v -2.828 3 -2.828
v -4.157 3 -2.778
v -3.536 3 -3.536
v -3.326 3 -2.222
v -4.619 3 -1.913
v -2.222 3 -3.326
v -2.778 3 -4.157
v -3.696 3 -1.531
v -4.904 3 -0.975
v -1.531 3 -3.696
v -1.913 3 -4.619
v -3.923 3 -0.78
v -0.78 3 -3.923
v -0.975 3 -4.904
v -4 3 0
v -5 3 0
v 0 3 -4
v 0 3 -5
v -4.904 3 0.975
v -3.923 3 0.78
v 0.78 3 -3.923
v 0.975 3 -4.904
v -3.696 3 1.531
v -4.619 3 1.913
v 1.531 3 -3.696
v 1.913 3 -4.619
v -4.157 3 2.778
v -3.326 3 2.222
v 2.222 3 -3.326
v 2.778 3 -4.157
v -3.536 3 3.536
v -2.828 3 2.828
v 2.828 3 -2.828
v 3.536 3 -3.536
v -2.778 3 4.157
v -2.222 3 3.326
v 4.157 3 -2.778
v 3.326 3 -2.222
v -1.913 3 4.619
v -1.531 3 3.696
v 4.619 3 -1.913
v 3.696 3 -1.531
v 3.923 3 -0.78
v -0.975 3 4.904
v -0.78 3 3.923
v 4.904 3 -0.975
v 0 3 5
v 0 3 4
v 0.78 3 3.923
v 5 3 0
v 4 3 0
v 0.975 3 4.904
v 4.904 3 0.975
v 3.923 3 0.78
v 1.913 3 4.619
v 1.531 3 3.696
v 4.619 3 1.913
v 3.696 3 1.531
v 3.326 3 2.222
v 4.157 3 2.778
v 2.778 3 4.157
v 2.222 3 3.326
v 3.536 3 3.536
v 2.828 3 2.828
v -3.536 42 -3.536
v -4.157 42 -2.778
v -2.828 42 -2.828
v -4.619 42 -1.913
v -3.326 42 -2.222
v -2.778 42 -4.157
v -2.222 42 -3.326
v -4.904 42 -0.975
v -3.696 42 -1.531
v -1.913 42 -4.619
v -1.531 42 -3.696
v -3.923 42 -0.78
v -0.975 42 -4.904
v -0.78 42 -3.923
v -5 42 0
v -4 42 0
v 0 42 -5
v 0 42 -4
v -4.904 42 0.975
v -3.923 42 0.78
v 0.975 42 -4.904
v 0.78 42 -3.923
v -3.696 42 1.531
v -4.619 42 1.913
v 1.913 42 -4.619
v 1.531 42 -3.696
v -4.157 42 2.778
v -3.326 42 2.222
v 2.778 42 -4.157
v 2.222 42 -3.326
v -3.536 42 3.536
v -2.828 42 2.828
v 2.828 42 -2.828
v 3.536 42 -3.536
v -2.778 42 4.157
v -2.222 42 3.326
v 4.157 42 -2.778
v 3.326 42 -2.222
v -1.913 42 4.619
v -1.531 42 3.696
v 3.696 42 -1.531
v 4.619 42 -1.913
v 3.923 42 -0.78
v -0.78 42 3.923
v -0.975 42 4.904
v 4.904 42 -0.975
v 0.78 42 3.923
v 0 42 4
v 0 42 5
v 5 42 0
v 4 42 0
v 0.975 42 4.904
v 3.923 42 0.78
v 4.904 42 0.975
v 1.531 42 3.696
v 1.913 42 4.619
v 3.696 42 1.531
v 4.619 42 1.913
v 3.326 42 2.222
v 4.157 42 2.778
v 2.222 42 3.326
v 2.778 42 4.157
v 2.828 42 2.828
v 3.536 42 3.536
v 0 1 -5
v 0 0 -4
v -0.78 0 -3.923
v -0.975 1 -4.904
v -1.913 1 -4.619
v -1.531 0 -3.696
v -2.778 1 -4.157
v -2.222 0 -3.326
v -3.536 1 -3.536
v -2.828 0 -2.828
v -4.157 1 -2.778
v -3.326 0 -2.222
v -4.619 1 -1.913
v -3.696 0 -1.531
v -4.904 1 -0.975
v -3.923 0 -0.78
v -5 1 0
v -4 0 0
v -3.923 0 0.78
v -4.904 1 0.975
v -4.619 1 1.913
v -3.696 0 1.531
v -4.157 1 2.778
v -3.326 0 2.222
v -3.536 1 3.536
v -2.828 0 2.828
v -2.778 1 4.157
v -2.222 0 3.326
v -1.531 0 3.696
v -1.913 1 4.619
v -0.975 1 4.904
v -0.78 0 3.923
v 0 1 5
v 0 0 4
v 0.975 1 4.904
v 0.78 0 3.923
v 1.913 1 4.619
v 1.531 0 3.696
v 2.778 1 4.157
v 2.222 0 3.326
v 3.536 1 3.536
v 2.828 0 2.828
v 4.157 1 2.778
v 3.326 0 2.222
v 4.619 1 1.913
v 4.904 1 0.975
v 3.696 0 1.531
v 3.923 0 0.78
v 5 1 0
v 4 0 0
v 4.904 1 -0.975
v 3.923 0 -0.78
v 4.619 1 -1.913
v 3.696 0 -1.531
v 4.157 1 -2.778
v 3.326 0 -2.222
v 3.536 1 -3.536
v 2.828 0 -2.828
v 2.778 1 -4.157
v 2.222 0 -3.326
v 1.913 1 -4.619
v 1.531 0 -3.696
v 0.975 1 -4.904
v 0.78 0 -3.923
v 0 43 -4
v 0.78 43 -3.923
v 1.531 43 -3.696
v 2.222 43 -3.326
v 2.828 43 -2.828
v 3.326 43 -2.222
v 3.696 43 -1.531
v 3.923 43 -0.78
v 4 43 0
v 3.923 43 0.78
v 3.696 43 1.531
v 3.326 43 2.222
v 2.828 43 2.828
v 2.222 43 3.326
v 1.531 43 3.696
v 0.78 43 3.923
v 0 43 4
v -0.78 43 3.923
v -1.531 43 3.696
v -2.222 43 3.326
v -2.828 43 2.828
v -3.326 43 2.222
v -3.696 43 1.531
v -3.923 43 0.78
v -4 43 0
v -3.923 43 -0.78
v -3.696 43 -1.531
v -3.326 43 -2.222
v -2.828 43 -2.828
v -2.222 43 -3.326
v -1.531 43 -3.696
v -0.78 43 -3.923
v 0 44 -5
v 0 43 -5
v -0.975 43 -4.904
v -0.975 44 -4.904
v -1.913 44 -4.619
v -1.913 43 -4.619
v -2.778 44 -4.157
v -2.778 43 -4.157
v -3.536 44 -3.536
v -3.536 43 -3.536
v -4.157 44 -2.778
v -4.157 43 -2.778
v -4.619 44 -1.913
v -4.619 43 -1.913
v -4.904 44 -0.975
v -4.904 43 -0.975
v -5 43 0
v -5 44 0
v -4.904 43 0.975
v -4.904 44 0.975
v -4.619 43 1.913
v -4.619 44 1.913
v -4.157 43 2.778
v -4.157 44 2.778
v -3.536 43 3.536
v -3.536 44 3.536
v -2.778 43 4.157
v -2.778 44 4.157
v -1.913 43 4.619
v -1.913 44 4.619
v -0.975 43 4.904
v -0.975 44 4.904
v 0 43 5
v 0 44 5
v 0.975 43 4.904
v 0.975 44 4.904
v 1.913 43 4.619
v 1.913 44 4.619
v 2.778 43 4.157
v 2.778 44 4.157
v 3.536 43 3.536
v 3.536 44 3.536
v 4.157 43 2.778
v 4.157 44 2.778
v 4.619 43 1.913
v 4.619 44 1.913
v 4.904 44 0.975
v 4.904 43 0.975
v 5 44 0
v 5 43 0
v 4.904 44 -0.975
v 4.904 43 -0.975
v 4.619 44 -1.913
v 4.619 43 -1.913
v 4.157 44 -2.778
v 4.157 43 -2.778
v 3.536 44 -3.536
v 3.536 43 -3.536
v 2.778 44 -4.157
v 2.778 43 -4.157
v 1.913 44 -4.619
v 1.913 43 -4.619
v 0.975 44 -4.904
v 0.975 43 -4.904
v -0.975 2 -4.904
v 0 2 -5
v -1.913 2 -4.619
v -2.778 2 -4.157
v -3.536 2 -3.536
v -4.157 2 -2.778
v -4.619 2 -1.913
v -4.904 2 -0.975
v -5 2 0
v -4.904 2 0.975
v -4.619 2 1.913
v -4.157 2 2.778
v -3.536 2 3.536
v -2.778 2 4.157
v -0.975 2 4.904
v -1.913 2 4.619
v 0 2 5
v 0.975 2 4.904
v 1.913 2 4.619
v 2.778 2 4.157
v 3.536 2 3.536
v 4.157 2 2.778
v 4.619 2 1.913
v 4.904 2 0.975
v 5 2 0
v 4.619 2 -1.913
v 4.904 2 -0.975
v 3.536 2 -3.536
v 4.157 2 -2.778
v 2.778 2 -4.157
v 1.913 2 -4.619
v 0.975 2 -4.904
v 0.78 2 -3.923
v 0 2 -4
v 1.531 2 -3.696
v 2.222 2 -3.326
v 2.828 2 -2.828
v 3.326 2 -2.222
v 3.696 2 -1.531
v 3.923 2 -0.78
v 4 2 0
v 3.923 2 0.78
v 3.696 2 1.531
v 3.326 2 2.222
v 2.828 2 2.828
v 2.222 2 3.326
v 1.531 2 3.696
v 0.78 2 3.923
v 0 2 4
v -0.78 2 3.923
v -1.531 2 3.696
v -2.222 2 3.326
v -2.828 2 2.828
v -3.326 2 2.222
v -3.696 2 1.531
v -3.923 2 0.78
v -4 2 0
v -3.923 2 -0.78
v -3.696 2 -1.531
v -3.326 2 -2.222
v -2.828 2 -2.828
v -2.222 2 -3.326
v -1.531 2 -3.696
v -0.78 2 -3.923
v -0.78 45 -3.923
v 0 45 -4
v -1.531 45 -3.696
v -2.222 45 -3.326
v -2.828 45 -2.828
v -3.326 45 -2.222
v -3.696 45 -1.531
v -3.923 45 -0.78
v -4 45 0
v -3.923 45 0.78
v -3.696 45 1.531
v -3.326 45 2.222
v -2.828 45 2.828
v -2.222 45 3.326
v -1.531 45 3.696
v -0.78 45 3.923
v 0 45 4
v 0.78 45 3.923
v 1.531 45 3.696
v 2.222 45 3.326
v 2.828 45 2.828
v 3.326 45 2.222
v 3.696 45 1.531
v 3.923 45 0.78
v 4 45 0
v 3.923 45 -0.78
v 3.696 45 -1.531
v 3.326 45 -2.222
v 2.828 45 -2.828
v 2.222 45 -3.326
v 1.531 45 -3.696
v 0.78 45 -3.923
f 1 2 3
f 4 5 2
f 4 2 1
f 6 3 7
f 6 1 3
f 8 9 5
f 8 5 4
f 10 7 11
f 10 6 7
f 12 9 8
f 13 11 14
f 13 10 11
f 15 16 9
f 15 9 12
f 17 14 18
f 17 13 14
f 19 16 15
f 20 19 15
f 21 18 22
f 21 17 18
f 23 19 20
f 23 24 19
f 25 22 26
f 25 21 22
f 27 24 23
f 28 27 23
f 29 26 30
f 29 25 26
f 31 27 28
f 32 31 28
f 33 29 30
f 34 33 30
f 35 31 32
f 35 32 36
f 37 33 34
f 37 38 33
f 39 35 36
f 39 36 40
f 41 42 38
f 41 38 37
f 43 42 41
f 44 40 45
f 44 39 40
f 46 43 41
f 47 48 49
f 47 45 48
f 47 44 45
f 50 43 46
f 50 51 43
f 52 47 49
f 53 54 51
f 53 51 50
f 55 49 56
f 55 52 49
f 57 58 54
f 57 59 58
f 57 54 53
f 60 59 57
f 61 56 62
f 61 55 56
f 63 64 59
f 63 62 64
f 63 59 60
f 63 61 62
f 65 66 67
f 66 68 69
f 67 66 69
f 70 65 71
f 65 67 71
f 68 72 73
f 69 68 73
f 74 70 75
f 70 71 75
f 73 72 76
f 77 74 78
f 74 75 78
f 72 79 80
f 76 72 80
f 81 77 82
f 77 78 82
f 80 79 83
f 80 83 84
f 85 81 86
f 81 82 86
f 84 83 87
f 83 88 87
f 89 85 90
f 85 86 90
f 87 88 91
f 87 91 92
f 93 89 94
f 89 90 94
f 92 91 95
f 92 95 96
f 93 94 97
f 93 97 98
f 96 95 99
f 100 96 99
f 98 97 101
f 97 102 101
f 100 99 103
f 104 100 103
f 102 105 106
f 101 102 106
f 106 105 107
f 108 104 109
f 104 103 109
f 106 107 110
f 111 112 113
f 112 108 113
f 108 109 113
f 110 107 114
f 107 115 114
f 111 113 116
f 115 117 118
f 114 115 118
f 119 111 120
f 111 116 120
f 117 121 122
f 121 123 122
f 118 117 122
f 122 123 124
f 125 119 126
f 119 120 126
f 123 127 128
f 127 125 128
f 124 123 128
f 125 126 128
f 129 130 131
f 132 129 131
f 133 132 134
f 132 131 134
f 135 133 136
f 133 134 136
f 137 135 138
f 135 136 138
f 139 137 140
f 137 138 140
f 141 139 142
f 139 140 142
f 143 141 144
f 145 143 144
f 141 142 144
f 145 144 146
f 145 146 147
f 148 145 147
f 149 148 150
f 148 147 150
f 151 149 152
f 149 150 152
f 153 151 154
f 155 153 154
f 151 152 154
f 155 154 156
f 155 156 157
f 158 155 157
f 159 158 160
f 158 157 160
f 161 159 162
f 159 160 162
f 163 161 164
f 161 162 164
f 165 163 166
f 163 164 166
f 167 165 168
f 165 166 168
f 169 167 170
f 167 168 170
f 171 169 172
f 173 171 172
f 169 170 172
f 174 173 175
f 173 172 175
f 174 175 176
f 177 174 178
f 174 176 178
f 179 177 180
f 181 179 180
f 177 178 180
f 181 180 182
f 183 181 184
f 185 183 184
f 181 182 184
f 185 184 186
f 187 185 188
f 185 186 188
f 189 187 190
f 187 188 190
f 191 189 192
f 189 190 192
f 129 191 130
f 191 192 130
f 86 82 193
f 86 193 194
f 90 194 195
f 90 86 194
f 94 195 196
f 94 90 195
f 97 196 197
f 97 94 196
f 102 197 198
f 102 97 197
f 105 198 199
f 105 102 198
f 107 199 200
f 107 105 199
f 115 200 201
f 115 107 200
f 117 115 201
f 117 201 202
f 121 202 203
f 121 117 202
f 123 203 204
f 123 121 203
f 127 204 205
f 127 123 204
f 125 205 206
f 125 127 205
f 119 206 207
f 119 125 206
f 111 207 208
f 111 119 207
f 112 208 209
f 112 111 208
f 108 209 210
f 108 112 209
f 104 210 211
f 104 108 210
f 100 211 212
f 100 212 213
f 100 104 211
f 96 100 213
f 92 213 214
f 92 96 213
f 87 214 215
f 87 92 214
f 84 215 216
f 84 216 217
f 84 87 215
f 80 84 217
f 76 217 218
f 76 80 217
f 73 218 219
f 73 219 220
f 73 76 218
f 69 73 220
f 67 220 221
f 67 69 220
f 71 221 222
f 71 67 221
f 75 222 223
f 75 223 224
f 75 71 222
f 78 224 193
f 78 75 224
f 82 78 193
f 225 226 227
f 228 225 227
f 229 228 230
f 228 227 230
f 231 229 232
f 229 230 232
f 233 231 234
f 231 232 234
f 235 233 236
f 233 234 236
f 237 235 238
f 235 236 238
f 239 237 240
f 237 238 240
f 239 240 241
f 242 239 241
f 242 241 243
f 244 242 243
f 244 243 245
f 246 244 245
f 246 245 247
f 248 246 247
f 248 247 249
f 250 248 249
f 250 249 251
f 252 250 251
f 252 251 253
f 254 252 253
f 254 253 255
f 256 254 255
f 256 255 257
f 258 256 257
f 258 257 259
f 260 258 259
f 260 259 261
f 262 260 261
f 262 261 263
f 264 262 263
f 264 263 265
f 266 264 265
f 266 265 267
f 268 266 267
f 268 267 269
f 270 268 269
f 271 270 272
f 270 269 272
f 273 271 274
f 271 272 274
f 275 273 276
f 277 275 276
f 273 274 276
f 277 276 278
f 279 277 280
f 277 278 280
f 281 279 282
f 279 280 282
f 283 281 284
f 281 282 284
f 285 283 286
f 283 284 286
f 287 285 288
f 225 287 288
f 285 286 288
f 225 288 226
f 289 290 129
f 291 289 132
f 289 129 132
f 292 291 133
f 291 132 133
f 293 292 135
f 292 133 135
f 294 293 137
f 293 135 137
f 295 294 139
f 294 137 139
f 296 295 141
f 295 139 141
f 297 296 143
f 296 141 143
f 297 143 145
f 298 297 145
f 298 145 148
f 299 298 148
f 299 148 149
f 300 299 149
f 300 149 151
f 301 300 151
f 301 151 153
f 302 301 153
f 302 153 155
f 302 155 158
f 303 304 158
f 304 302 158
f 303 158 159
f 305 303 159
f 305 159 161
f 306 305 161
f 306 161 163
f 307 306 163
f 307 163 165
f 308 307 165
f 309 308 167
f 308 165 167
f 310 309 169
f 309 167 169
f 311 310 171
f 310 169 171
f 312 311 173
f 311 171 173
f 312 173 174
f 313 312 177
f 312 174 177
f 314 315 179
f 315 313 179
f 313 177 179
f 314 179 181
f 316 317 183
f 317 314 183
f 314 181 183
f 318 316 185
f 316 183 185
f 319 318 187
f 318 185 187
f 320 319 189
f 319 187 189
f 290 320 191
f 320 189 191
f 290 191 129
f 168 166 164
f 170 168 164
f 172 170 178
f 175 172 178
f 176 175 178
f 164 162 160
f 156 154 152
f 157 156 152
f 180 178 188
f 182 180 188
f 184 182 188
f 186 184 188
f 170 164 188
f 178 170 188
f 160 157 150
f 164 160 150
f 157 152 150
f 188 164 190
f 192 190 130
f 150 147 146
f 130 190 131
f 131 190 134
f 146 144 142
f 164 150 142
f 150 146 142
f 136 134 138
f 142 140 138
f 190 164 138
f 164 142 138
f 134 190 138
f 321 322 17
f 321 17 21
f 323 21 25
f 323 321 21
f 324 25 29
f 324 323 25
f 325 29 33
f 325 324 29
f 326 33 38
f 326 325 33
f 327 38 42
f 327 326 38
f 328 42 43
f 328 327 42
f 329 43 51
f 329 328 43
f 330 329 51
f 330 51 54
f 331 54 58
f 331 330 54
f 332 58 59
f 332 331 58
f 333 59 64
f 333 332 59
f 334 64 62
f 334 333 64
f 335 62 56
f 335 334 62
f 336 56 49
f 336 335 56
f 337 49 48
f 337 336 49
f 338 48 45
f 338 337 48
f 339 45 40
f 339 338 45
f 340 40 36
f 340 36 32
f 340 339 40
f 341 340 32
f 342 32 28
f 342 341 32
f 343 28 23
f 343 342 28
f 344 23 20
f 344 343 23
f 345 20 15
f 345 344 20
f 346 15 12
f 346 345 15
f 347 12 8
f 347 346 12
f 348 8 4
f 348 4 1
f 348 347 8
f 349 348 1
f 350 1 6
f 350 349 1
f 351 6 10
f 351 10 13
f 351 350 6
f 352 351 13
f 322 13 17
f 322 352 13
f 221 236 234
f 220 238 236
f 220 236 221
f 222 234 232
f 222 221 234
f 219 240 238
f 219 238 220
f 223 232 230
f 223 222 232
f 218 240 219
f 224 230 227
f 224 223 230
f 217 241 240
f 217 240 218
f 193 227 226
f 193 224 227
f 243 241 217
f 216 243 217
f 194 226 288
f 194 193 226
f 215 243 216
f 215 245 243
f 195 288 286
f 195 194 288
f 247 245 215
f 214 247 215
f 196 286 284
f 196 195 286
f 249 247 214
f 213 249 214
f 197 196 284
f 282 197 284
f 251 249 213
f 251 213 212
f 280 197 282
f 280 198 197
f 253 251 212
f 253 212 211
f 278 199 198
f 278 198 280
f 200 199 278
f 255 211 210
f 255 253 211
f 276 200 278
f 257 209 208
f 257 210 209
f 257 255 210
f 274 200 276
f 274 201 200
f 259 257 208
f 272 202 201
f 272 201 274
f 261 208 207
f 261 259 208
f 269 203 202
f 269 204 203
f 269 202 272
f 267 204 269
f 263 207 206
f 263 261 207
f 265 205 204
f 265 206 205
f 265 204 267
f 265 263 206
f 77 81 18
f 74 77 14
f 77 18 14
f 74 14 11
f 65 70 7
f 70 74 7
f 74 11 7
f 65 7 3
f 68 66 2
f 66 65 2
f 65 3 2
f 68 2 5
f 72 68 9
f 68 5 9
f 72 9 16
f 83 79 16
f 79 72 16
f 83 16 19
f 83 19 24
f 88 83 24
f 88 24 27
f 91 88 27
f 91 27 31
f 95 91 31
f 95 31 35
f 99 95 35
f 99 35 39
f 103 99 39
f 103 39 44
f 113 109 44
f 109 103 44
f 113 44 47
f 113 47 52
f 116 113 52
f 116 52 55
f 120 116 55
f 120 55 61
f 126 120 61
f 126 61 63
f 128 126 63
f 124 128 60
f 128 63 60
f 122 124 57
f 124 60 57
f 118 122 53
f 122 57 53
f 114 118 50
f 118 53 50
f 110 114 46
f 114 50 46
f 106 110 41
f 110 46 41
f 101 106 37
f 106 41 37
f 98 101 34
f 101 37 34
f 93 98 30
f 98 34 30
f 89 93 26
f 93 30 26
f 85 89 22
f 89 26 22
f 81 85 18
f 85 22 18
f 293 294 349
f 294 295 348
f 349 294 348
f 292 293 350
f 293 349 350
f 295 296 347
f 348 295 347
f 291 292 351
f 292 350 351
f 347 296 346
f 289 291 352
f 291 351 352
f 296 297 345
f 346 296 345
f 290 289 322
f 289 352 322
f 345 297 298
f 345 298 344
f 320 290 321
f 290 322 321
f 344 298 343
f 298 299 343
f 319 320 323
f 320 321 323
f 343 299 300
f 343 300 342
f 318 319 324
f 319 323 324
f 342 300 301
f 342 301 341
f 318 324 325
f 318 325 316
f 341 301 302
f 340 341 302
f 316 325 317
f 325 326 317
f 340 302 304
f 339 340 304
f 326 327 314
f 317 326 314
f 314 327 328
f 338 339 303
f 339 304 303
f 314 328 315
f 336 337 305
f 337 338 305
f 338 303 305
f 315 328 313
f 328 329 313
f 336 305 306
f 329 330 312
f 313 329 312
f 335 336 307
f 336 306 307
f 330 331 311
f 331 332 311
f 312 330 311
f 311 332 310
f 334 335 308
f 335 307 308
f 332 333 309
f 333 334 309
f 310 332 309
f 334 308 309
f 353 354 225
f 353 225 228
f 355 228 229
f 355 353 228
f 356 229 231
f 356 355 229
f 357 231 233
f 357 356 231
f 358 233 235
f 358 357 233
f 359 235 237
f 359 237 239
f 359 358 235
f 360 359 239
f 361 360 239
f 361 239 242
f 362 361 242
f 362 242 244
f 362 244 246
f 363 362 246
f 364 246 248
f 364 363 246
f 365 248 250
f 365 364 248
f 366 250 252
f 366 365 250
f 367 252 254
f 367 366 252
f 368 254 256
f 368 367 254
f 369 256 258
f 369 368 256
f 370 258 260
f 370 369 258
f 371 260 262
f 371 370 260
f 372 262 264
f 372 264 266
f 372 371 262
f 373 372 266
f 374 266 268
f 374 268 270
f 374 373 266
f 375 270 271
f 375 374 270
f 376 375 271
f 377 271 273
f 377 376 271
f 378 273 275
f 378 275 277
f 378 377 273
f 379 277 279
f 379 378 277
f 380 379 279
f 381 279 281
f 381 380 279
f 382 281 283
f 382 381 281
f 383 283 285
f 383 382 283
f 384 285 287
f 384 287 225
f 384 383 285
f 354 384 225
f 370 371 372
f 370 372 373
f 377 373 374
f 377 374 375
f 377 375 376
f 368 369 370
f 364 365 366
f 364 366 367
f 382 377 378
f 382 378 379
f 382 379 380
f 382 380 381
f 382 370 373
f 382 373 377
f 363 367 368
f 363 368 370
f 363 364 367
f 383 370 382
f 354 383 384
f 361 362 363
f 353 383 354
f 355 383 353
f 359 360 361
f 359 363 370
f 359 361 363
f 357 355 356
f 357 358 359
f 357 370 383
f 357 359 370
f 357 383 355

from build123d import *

# Parameters (mm, degrees)
SKETCH1_R           = 5
BOSS_EXTRUDE1_DEPTH = 45
CHAMFER1_SIZE       = 1
CUT_EXTRUDE1_START  = -2
SKETCH2_R           = 6
SKETCH2_R_2         = 4
CUT_EXTRUDE1_DEPTH  = 1
CUT_EXTRUDE2_START  = -42
SKETCH2_2_R         = 6
SKETCH2_2_R_2       = 4
CUT_EXTRUDE2_DEPTH  = 1


with BuildPart() as part:
    # Sketch1 → Boss-Extrude1 (new body)
    with BuildSketch(Plane(origin=(0, 0, 0), x_dir=(1, 0, 0), z_dir=(0, 1, 0))):
        Circle(SKETCH1_R)
    extrude(amount=BOSS_EXTRUDE1_DEPTH)

    # Chamfer1
    chamfer1_edges = [part.edges().sort_by_distance(p)[0] for p in [
        (-5, 45, 0),
        (-5, 0, 0),
    ]]
    chamfer(chamfer1_edges, length=CHAMFER1_SIZE)

    # Sketch2 → Cut-Extrude1 (cut)
    with BuildSketch(Plane.XZ.offset(CUT_EXTRUDE1_START)):
        Circle(SKETCH2_R)
        Circle(SKETCH2_R_2, mode=Mode.SUBTRACT)
    extrude(amount=-CUT_EXTRUDE1_DEPTH, mode=Mode.SUBTRACT)

    # Sketch2<2> → Cut-Extrude2 (cut)
    with BuildSketch(Plane.XZ.offset(CUT_EXTRUDE2_START)):
        Circle(SKETCH2_2_R)
        Circle(SKETCH2_2_R_2, mode=Mode.SUBTRACT)
    extrude(amount=-CUT_EXTRUDE2_DEPTH, mode=Mode.SUBTRACT)


solid = part.part
